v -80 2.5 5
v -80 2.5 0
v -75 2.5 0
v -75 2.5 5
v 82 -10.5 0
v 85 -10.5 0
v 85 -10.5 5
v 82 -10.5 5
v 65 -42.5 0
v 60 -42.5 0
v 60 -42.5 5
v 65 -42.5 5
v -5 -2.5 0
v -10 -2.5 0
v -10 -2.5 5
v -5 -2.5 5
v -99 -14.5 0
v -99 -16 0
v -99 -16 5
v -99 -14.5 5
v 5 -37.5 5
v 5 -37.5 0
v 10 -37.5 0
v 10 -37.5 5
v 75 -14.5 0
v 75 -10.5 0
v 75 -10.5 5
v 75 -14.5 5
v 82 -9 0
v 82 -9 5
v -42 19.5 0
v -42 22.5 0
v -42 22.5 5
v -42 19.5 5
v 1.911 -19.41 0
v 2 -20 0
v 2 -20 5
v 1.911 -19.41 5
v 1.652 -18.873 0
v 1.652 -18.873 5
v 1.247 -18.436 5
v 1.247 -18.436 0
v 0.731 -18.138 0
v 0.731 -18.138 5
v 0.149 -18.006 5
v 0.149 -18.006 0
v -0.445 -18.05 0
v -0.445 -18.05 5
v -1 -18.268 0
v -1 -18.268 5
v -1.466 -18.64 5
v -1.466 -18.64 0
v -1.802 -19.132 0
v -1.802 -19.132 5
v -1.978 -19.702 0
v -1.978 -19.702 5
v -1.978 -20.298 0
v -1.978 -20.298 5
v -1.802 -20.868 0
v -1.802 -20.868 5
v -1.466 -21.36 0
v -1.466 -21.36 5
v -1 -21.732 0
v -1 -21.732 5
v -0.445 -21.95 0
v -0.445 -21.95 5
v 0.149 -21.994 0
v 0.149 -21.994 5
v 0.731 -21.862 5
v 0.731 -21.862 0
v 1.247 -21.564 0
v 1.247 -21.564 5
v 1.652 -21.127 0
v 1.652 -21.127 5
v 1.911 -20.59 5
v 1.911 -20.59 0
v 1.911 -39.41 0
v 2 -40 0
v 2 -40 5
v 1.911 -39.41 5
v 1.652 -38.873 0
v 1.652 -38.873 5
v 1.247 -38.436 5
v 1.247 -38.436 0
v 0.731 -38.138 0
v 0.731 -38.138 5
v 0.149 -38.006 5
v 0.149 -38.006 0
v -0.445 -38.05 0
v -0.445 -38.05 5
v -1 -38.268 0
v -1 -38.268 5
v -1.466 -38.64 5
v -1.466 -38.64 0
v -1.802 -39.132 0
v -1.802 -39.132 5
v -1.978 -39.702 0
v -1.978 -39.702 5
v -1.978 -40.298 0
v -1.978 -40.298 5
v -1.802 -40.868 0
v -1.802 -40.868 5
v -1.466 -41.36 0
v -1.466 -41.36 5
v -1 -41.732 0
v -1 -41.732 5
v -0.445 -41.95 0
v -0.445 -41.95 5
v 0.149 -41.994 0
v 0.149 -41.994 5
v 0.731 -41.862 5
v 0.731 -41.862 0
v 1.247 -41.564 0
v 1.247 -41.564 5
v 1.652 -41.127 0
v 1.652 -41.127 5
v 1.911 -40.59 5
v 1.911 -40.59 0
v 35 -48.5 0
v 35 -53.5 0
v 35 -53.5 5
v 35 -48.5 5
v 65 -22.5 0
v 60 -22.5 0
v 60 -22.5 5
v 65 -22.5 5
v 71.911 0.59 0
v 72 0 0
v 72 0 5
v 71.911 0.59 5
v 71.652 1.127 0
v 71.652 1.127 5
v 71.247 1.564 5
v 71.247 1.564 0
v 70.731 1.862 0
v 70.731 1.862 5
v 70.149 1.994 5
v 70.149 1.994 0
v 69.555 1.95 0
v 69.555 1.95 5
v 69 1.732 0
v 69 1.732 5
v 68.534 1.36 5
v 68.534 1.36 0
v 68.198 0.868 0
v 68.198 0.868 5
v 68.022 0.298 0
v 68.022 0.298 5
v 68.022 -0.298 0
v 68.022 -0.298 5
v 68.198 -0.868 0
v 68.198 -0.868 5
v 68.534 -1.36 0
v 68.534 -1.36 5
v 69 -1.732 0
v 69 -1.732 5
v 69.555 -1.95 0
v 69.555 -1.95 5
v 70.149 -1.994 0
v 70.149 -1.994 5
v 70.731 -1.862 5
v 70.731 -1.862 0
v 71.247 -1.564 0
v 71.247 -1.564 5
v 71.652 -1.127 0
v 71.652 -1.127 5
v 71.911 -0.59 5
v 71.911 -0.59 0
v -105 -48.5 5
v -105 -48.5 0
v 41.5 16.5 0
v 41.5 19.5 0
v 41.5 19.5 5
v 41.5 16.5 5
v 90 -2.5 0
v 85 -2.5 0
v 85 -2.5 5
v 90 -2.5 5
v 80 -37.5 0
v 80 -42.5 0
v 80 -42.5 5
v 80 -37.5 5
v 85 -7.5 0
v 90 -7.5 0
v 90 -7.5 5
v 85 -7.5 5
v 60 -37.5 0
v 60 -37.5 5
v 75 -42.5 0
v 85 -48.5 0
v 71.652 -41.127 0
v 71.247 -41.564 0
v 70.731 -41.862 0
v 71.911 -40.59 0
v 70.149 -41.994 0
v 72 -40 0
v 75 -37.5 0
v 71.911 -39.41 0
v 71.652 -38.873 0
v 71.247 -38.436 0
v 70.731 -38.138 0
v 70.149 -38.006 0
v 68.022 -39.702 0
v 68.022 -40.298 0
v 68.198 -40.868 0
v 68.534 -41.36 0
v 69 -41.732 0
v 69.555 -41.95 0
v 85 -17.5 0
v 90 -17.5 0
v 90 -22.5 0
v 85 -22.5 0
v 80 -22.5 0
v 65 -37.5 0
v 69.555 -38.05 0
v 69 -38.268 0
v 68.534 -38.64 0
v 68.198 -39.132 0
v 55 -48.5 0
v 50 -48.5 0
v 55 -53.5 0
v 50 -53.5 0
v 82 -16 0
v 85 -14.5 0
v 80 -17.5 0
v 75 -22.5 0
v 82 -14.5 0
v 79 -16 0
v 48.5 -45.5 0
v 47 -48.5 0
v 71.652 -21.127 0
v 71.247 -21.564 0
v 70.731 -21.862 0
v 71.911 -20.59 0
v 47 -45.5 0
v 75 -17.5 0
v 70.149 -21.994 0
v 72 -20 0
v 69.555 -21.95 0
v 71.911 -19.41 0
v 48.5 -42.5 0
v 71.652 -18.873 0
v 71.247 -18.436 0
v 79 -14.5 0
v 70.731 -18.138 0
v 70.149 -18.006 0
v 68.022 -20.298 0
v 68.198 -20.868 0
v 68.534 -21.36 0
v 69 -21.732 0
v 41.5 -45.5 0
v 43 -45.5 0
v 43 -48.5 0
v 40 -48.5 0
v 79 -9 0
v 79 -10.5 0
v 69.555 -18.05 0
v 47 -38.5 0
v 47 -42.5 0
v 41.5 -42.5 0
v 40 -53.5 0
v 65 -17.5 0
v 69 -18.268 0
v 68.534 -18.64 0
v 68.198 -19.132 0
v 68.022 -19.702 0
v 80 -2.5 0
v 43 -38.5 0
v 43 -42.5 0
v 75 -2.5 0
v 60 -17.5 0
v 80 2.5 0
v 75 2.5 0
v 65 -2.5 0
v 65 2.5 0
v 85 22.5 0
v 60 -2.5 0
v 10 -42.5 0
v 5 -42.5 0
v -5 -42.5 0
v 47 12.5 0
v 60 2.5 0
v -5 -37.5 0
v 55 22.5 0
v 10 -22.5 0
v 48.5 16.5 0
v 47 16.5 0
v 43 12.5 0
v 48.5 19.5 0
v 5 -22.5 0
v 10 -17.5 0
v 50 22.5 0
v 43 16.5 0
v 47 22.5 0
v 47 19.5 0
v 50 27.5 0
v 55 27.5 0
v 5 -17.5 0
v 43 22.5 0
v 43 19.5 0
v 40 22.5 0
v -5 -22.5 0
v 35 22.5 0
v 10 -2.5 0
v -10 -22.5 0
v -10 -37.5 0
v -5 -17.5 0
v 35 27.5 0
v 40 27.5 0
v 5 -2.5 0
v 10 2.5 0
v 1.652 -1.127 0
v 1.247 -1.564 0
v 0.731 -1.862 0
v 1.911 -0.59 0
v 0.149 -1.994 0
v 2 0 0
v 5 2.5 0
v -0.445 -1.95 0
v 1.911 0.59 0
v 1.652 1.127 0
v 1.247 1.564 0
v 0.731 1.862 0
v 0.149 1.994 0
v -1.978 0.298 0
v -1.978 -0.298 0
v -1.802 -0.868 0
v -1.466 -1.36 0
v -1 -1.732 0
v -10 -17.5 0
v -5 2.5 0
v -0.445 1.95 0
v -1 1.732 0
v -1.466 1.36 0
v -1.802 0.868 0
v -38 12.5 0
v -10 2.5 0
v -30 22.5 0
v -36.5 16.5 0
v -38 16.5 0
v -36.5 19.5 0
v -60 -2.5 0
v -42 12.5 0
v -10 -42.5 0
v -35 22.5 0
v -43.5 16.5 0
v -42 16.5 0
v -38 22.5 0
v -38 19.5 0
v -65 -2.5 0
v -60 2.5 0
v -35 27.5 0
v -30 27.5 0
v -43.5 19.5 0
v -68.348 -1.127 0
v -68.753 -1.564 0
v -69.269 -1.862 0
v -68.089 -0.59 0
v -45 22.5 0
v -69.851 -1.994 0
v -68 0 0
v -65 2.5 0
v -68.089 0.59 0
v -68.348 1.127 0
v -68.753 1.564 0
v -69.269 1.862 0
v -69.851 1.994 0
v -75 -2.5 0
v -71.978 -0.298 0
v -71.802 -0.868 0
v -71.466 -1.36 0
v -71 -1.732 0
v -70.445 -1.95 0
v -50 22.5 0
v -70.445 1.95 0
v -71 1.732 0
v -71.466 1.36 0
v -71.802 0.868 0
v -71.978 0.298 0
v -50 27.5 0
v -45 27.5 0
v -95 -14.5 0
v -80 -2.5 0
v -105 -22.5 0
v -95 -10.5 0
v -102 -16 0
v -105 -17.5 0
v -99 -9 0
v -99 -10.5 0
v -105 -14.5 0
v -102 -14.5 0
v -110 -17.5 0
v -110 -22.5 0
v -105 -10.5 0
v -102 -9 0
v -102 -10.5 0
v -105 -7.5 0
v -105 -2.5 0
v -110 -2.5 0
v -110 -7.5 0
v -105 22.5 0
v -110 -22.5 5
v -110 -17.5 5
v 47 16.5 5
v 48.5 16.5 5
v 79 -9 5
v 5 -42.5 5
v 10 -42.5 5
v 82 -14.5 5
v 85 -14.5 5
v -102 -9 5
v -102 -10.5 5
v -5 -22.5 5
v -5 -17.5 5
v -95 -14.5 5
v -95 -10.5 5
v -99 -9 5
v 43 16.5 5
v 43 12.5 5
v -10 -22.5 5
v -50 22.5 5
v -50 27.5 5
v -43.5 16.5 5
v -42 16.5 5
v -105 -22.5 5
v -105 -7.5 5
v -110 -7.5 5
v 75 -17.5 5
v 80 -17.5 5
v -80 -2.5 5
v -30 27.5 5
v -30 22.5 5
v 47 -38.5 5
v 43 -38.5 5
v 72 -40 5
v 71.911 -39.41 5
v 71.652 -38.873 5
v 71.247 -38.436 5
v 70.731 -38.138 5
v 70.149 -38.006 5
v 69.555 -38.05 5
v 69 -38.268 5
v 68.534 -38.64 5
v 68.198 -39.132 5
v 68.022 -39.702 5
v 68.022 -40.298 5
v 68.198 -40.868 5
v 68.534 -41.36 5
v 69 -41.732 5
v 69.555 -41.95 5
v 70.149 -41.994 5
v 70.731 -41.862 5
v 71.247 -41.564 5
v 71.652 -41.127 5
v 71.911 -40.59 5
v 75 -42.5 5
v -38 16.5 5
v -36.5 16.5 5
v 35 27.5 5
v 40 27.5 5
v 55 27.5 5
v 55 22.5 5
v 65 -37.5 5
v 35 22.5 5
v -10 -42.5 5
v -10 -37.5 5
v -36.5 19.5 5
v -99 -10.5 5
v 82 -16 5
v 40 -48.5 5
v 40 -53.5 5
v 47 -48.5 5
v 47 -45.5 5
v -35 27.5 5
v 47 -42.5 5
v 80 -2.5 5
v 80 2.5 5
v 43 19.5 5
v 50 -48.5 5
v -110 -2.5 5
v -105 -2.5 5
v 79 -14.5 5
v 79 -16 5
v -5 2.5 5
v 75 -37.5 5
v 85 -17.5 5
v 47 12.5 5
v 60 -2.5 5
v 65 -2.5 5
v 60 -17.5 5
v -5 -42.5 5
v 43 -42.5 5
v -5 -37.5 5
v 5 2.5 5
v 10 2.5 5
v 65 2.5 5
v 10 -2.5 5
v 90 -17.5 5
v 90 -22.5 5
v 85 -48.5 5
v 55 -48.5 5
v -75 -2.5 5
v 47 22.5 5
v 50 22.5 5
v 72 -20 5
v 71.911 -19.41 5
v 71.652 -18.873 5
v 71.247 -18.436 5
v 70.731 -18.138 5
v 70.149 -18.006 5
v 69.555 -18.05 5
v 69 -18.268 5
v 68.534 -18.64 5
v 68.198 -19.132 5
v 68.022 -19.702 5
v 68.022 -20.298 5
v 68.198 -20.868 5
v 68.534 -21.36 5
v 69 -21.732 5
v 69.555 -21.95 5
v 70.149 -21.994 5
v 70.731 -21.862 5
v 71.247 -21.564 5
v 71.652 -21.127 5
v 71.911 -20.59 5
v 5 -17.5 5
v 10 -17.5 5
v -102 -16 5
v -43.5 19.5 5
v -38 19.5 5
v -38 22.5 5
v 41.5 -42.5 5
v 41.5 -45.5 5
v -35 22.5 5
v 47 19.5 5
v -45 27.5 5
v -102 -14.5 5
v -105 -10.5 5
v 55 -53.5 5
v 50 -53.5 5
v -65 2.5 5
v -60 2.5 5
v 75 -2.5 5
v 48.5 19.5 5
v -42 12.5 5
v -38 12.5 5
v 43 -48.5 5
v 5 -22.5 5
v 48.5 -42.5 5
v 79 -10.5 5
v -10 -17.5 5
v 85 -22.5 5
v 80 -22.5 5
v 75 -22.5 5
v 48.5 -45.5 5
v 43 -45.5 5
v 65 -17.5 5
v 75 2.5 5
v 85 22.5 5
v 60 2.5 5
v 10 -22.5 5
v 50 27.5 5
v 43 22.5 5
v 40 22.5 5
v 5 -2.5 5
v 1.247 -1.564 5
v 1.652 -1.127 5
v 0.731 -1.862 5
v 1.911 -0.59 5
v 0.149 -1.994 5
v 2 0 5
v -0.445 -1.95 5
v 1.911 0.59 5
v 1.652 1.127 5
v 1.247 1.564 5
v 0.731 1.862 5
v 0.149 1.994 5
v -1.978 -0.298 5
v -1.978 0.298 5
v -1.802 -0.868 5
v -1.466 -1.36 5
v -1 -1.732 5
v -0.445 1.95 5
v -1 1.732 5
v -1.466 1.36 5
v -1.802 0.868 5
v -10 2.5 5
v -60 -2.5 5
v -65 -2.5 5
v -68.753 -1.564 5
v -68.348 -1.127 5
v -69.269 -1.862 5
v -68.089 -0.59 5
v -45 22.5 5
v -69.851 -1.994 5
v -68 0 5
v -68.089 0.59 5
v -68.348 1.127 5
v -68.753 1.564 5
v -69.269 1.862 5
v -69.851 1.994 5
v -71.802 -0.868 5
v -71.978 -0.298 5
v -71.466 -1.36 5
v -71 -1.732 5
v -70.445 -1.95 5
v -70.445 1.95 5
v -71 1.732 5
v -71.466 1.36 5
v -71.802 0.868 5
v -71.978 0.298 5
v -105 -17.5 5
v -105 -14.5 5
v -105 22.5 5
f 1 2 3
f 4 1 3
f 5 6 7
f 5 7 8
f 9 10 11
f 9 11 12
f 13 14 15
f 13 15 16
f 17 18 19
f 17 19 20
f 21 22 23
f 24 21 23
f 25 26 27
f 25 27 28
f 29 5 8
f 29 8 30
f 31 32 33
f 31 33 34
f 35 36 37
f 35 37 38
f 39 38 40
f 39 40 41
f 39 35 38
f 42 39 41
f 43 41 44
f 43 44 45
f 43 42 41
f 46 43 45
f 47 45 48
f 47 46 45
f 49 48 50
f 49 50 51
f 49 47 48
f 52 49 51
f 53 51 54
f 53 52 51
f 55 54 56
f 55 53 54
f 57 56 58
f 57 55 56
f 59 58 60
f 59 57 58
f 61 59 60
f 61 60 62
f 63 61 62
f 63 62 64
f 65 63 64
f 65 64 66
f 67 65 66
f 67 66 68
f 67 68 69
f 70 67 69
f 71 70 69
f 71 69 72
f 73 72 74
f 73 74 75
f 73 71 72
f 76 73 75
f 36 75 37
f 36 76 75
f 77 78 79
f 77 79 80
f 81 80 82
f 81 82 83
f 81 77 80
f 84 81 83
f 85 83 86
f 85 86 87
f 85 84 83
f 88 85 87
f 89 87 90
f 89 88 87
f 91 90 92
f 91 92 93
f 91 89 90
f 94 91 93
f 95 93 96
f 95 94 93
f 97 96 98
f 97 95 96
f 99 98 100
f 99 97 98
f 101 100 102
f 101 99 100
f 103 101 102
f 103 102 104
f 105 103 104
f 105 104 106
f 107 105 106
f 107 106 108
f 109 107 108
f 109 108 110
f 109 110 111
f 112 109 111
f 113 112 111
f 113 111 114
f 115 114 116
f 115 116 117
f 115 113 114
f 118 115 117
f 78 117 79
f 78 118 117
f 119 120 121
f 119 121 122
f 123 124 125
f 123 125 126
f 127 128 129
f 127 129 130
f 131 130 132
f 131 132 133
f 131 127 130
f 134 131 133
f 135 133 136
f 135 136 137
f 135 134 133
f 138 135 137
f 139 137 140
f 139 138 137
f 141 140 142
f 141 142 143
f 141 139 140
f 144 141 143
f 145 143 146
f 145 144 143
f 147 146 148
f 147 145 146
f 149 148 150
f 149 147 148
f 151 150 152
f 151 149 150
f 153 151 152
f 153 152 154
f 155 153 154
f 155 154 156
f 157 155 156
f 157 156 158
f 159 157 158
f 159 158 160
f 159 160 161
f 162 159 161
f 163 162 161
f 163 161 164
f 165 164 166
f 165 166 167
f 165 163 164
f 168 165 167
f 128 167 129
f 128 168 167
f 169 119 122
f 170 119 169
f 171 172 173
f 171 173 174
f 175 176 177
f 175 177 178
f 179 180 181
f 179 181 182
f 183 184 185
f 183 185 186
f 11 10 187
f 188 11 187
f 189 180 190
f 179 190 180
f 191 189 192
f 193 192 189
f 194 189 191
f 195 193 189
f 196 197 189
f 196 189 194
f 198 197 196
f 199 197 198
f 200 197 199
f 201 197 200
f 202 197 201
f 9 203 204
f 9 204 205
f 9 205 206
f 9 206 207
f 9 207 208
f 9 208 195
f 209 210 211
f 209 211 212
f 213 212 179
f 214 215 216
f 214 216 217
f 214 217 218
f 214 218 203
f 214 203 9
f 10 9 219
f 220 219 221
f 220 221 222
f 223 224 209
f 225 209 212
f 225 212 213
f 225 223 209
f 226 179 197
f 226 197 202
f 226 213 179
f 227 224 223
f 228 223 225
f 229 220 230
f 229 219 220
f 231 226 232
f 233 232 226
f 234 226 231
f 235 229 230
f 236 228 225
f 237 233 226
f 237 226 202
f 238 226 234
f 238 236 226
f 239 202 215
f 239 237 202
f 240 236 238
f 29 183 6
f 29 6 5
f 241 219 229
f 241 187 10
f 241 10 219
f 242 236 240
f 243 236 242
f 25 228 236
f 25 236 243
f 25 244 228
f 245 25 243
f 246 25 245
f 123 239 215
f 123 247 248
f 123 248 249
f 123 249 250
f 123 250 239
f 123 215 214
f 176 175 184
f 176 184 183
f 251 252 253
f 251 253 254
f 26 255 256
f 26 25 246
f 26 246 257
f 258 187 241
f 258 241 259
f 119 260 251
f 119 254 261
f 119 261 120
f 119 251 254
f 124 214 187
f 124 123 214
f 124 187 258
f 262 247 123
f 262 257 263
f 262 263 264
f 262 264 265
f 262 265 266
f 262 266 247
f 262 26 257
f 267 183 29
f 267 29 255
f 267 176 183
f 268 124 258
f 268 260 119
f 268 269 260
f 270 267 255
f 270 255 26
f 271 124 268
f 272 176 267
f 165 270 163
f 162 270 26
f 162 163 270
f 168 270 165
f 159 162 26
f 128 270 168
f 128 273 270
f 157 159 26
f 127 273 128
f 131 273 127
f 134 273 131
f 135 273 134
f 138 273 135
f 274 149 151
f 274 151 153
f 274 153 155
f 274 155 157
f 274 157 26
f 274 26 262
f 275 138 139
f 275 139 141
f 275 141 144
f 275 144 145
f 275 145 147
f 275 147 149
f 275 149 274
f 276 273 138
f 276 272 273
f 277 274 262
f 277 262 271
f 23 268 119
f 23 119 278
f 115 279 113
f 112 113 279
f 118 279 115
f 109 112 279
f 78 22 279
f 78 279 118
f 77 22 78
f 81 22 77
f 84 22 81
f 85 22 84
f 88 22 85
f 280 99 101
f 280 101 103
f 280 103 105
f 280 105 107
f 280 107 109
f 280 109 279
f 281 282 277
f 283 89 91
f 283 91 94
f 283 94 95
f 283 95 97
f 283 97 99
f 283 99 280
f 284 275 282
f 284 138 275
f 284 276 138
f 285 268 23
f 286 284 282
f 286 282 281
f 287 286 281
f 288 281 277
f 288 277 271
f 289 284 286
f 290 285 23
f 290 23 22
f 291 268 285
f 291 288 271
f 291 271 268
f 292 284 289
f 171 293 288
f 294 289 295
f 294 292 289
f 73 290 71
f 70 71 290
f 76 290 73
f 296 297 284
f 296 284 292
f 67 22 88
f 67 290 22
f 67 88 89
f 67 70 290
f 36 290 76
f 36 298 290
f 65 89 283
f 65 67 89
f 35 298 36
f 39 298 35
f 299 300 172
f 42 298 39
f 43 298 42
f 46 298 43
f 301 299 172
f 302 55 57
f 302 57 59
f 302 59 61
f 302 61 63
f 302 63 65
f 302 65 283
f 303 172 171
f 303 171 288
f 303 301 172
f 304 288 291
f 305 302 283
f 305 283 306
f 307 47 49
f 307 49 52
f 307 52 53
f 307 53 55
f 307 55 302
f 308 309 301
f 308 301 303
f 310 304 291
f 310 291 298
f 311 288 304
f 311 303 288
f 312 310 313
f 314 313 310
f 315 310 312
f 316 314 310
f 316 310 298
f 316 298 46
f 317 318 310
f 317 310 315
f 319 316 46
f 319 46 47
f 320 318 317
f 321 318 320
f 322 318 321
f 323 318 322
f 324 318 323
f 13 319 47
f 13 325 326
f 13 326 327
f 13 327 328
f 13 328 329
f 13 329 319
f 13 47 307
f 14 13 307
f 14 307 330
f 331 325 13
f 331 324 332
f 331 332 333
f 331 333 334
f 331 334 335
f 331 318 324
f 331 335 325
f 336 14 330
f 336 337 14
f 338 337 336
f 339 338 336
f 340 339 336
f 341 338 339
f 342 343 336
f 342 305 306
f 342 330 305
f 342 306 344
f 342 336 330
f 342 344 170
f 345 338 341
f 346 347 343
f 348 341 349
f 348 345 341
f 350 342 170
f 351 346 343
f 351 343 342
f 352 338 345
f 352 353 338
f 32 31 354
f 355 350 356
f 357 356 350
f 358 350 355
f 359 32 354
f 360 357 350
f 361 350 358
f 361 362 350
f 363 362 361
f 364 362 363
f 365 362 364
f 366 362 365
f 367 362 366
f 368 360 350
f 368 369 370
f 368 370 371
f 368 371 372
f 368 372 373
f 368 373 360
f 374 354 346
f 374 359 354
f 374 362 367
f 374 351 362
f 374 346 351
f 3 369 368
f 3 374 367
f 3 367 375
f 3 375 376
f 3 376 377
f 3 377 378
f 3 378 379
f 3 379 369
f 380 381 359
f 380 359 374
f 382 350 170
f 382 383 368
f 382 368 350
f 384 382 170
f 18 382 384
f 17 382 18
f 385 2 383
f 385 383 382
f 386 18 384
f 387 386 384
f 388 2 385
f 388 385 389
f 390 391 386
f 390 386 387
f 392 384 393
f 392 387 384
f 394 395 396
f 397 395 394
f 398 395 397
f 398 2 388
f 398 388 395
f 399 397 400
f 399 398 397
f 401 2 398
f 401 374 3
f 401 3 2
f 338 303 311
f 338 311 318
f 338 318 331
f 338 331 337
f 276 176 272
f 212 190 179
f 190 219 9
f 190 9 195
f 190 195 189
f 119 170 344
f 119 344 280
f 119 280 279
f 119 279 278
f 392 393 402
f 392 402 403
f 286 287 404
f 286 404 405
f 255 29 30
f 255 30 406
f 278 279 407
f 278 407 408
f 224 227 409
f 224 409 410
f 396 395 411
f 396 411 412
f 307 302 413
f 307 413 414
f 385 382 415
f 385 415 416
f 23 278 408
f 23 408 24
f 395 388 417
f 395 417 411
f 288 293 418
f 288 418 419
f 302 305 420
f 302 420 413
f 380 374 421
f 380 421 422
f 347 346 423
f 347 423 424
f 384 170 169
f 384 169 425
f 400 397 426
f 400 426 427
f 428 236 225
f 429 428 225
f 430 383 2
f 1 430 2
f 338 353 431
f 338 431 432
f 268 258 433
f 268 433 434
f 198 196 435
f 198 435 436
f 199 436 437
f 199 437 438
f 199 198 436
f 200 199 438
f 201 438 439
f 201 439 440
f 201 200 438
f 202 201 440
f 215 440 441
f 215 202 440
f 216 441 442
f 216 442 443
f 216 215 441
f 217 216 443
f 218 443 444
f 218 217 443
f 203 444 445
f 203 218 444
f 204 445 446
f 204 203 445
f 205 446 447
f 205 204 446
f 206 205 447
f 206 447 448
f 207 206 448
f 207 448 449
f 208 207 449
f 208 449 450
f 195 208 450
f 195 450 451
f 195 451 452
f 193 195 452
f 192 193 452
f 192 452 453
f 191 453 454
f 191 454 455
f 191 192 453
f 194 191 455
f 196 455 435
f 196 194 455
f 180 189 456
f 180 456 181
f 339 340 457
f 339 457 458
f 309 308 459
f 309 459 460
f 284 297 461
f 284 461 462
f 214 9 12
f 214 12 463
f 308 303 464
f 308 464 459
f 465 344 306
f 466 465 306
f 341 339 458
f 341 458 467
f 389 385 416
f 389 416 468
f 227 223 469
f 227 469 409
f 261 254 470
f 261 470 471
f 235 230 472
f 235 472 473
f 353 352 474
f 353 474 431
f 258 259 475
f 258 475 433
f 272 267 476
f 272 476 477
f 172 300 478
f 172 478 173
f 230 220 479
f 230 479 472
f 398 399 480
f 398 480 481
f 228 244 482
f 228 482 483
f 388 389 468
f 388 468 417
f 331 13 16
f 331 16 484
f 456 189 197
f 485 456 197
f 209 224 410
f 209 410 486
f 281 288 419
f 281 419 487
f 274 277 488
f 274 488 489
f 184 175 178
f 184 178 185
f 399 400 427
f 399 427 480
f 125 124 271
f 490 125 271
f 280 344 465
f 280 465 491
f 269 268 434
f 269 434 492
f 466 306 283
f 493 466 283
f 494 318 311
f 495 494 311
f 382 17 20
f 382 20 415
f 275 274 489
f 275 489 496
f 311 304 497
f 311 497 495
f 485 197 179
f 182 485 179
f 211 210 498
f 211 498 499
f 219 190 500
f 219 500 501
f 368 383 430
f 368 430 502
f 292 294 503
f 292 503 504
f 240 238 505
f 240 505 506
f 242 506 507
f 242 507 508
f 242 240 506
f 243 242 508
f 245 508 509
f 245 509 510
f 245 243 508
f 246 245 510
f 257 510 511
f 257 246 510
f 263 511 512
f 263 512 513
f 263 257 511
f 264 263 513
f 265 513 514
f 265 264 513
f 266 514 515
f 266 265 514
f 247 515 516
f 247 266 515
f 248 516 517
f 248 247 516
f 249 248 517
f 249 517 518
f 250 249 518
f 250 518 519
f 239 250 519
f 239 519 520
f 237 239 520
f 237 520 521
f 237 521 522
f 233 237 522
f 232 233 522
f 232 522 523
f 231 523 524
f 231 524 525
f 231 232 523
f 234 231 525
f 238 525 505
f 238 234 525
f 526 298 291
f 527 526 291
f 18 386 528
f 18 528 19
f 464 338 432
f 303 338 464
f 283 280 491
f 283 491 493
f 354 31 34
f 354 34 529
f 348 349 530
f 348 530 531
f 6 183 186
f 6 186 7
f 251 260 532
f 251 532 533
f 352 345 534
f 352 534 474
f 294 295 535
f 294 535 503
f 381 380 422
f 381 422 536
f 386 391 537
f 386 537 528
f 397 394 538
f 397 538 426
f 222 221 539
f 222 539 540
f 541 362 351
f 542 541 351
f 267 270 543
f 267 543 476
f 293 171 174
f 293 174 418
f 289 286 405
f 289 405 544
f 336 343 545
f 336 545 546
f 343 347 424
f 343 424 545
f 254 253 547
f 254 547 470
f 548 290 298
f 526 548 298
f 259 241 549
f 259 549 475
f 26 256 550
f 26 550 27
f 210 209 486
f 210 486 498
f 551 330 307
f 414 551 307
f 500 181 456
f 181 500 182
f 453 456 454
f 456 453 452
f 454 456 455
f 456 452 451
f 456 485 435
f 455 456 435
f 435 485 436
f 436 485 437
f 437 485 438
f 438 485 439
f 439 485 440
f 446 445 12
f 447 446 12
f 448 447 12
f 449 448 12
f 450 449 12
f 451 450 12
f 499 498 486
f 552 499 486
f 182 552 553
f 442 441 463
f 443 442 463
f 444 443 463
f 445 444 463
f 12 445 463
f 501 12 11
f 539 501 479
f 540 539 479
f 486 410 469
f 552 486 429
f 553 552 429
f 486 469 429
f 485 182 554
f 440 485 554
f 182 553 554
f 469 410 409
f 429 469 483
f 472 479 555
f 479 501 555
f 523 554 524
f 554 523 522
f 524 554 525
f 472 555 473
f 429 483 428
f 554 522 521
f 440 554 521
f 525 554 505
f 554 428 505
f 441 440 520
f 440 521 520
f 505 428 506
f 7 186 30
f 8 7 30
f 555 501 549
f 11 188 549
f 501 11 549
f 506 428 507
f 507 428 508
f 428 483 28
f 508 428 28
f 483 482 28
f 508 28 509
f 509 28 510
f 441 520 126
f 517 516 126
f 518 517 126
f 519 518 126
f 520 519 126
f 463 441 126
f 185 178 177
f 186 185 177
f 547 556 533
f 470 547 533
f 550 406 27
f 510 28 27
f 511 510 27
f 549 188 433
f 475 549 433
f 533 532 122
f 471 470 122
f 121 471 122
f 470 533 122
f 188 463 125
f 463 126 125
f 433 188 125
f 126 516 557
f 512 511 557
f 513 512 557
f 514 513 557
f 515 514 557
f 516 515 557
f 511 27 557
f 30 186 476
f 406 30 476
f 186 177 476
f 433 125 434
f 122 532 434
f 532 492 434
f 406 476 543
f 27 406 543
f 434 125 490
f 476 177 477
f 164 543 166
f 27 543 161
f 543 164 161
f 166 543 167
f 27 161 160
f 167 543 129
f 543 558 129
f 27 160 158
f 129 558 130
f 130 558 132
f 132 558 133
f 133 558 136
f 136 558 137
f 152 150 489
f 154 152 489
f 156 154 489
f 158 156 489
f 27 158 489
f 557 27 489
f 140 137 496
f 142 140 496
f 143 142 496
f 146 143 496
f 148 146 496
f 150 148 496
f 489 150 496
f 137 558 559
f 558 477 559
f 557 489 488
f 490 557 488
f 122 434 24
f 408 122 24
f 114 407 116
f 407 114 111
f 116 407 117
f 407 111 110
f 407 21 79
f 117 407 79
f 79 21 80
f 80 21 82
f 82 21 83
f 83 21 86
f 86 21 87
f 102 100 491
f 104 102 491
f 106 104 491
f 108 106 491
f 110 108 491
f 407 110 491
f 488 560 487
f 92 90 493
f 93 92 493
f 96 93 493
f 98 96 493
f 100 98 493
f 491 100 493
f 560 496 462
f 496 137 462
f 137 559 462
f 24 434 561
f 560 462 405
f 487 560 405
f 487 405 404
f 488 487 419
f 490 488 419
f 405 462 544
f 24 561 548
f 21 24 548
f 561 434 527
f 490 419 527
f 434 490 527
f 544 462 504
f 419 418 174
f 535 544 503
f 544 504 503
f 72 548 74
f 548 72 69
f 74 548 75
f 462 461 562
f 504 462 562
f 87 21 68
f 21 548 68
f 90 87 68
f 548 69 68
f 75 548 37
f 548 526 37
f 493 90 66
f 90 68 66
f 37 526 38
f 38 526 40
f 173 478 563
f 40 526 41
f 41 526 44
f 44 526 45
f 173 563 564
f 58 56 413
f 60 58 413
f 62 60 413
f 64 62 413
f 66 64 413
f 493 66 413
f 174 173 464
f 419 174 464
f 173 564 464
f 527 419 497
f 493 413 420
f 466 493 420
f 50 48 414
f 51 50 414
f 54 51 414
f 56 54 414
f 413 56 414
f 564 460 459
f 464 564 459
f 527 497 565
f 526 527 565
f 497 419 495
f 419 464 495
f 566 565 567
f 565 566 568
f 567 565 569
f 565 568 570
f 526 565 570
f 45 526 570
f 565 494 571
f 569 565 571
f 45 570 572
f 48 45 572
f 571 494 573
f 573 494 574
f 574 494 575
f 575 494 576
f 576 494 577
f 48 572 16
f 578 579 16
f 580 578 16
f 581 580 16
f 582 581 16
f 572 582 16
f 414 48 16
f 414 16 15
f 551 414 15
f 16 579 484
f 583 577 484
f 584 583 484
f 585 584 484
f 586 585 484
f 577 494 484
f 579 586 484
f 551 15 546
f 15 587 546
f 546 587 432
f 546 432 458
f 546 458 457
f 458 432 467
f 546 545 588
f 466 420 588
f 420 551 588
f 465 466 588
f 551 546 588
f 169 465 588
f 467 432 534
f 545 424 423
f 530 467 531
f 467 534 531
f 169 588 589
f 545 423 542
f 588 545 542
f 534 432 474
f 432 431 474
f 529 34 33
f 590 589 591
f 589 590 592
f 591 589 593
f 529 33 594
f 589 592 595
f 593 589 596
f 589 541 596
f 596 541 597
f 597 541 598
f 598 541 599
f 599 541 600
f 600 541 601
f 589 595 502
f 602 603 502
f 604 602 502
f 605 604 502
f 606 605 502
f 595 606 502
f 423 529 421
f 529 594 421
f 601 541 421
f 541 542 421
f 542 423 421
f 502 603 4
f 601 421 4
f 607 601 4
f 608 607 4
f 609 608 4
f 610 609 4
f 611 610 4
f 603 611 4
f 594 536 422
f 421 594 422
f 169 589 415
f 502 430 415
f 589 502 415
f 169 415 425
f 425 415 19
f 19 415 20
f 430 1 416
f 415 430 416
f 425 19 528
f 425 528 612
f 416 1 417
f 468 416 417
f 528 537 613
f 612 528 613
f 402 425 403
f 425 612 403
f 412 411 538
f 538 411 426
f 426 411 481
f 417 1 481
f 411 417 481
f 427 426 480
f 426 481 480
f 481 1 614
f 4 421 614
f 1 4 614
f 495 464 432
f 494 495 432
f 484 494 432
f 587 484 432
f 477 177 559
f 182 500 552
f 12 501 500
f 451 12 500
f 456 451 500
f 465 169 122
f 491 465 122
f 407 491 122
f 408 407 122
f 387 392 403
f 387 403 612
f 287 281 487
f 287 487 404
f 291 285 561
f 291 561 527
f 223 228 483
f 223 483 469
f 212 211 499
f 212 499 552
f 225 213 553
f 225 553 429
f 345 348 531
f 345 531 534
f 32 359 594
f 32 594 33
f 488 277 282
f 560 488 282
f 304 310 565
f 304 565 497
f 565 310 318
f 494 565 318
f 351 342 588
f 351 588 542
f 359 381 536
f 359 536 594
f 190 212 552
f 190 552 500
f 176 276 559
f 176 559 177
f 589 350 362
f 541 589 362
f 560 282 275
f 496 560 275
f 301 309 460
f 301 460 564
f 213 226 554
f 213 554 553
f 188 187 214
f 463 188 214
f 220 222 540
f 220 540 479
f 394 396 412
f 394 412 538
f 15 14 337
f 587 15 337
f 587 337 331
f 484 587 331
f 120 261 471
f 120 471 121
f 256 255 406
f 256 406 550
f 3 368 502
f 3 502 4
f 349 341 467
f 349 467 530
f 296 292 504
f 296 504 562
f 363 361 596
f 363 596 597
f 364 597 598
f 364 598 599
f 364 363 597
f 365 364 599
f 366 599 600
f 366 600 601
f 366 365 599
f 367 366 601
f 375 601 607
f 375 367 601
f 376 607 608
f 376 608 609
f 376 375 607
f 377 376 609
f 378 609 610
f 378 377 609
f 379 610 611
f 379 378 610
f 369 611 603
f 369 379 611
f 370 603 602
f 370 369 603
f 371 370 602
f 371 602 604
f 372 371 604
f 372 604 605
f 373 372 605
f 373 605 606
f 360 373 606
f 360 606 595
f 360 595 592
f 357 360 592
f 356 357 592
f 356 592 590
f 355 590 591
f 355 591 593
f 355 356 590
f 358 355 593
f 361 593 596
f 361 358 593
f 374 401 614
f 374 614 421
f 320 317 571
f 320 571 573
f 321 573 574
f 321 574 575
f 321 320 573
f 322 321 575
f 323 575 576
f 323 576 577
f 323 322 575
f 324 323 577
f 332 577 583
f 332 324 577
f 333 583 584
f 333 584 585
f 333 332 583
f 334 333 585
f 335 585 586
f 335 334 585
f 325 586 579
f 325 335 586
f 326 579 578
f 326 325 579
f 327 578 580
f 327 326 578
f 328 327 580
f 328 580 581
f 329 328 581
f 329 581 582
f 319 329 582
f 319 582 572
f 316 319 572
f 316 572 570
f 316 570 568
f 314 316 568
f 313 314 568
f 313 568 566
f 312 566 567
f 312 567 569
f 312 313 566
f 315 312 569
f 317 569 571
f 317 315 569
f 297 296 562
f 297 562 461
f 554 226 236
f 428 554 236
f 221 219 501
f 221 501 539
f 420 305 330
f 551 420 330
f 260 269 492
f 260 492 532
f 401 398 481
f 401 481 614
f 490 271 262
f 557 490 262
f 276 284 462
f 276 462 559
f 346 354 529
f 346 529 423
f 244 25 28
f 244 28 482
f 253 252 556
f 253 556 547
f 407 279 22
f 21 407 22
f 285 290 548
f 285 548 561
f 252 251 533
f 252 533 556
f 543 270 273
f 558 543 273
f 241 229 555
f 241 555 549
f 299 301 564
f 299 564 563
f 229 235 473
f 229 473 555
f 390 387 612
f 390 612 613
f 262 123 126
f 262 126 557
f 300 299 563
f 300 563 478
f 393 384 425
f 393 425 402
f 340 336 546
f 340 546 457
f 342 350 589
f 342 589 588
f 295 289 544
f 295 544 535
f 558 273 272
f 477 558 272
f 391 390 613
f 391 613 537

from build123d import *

# Parameters (mm, degrees)
ESQUISSE1_R        = 2
ESQUISSE1_W        = 5
ESQUISSE1_H        = 5
BOSS_EXTRU_1_DEPTH = 5


with BuildPart() as part:
    # Esquisse1 → Boss.-Extru.1 (new body)
    with BuildSketch(Plane.XY):
        Polygon((-105, 22.5), (-50, 22.5), (-50, 27.5), (-45, 27.5), (-45, 22.5), (-42, 22.5), (-42, 19.5), (-43.5, 19.5), (-43.5, 16.5), (-42, 16.5), (-42, 12.5), (-38, 12.5), (-38, 16.5), (-36.5, 16.5), (-36.5, 19.5), (-38, 19.5), (-38, 22.5), (-35, 22.5), (-35, 27.5), (-30, 27.5), (-30, 22.5), (35, 22.5), (35, 27.5), (40, 27.5), (40, 22.5), (43, 22.5), (43, 19.5), (41.5, 19.5), (41.5, 16.5), (43, 16.5), (43, 12.5), (47, 12.5), (47, 16.5), (48.5, 16.5), (48.5, 19.5), (47, 19.5), (47, 22.5), (50, 22.5), (50, 27.5), (55, 27.5), (55, 22.5), (85, 22.5), (85, -2.5), (90, -2.5), (90, -7.5), (85, -7.5), (85, -10.5), (82, -10.5), (82, -9), (79, -9), (79, -10.5), (75, -10.5), (75, -14.5), (79, -14.5), (79, -16), (82, -16), (82, -14.5), (85, -14.5), (85, -17.5), (90, -17.5), (90, -22.5), (85, -22.5), (85, -48.5), (55, -48.5), (55, -53.5), (50, -53.5), (50, -48.5), (47, -48.5), (47, -45.5), (48.5, -45.5), (48.5, -42.5), (47, -42.5), (47, -38.5), (43, -38.5), (43, -42.5), (41.5, -42.5), (41.5, -45.5), (43, -45.5), (43, -48.5), (40, -48.5), (40, -53.5), (35, -53.5), (35, -48.5), (-105, -48.5), (-105, -22.5), (-110, -22.5), (-110, -17.5), (-105, -17.5), (-105, -14.5), (-102, -14.5), (-102, -16), (-99, -16), (-99, -14.5), (-95, -14.5), (-95, -10.5), (-99, -10.5), (-99, -9), (-102, -9), (-102, -10.5), (-105, -10.5), (-105, -7.5), (-110, -7.5), (-110, -2.5), (-105, -2.5), align=None)
        Circle(ESQUISSE1_R, mode=Mode.SUBTRACT)
        with Locations((70, 0)):
            Circle(ESQUISSE1_R, mode=Mode.SUBTRACT)
        with Locations((0, -20)):
            Circle(ESQUISSE1_R, mode=Mode.SUBTRACT)
        with Locations((70, -20)):
            Circle(ESQUISSE1_R, mode=Mode.SUBTRACT)
        with Locations((0, -40)):
            Circle(ESQUISSE1_R, mode=Mode.SUBTRACT)
        with Locations((70, -40)):
            Circle(ESQUISSE1_R, mode=Mode.SUBTRACT)
        with Locations((-70, 0)):
            Circle(ESQUISSE1_R, mode=Mode.SUBTRACT)
        with Locations((-7.5, 0)):
            Rectangle(ESQUISSE1_W, ESQUISSE1_H, mode=Mode.SUBTRACT)
        with Locations((7.5, 0)):
            Rectangle(ESQUISSE1_W, ESQUISSE1_H, mode=Mode.SUBTRACT)
        with Locations((62.5, 0)):
            Rectangle(ESQUISSE1_W, ESQUISSE1_H, mode=Mode.SUBTRACT)
        with Locations((77.5, 0)):
            Rectangle(ESQUISSE1_W, ESQUISSE1_H, mode=Mode.SUBTRACT)
        with Locations((-7.5, -20)):
            Rectangle(ESQUISSE1_W, ESQUISSE1_H, mode=Mode.SUBTRACT)
        with Locations((7.5, -20)):
            Rectangle(ESQUISSE1_W, ESQUISSE1_H, mode=Mode.SUBTRACT)
        with Locations((62.5, -20)):
            Rectangle(ESQUISSE1_W, ESQUISSE1_H, mode=Mode.SUBTRACT)
        with Locations((77.5, -20)):
            Rectangle(ESQUISSE1_W, ESQUISSE1_H, mode=Mode.SUBTRACT)
        with Locations((-7.5, -40)):
            Rectangle(ESQUISSE1_W, ESQUISSE1_H, mode=Mode.SUBTRACT)
        with Locations((7.5, -40)):
            Rectangle(ESQUISSE1_W, ESQUISSE1_H, mode=Mode.SUBTRACT)
        with Locations((62.5, -40)):
            Rectangle(ESQUISSE1_W, ESQUISSE1_H, mode=Mode.SUBTRACT)
        with Locations((77.5, -40)):
            Rectangle(ESQUISSE1_W, ESQUISSE1_H, mode=Mode.SUBTRACT)
        with Locations((-77.5, 0)):
            Rectangle(ESQUISSE1_W, ESQUISSE1_H, mode=Mode.SUBTRACT)
        with Locations((-62.5, 0)):
            Rectangle(ESQUISSE1_W, ESQUISSE1_H, mode=Mode.SUBTRACT)
    extrude(amount=BOSS_EXTRU_1_DEPTH)


solid = part.part
